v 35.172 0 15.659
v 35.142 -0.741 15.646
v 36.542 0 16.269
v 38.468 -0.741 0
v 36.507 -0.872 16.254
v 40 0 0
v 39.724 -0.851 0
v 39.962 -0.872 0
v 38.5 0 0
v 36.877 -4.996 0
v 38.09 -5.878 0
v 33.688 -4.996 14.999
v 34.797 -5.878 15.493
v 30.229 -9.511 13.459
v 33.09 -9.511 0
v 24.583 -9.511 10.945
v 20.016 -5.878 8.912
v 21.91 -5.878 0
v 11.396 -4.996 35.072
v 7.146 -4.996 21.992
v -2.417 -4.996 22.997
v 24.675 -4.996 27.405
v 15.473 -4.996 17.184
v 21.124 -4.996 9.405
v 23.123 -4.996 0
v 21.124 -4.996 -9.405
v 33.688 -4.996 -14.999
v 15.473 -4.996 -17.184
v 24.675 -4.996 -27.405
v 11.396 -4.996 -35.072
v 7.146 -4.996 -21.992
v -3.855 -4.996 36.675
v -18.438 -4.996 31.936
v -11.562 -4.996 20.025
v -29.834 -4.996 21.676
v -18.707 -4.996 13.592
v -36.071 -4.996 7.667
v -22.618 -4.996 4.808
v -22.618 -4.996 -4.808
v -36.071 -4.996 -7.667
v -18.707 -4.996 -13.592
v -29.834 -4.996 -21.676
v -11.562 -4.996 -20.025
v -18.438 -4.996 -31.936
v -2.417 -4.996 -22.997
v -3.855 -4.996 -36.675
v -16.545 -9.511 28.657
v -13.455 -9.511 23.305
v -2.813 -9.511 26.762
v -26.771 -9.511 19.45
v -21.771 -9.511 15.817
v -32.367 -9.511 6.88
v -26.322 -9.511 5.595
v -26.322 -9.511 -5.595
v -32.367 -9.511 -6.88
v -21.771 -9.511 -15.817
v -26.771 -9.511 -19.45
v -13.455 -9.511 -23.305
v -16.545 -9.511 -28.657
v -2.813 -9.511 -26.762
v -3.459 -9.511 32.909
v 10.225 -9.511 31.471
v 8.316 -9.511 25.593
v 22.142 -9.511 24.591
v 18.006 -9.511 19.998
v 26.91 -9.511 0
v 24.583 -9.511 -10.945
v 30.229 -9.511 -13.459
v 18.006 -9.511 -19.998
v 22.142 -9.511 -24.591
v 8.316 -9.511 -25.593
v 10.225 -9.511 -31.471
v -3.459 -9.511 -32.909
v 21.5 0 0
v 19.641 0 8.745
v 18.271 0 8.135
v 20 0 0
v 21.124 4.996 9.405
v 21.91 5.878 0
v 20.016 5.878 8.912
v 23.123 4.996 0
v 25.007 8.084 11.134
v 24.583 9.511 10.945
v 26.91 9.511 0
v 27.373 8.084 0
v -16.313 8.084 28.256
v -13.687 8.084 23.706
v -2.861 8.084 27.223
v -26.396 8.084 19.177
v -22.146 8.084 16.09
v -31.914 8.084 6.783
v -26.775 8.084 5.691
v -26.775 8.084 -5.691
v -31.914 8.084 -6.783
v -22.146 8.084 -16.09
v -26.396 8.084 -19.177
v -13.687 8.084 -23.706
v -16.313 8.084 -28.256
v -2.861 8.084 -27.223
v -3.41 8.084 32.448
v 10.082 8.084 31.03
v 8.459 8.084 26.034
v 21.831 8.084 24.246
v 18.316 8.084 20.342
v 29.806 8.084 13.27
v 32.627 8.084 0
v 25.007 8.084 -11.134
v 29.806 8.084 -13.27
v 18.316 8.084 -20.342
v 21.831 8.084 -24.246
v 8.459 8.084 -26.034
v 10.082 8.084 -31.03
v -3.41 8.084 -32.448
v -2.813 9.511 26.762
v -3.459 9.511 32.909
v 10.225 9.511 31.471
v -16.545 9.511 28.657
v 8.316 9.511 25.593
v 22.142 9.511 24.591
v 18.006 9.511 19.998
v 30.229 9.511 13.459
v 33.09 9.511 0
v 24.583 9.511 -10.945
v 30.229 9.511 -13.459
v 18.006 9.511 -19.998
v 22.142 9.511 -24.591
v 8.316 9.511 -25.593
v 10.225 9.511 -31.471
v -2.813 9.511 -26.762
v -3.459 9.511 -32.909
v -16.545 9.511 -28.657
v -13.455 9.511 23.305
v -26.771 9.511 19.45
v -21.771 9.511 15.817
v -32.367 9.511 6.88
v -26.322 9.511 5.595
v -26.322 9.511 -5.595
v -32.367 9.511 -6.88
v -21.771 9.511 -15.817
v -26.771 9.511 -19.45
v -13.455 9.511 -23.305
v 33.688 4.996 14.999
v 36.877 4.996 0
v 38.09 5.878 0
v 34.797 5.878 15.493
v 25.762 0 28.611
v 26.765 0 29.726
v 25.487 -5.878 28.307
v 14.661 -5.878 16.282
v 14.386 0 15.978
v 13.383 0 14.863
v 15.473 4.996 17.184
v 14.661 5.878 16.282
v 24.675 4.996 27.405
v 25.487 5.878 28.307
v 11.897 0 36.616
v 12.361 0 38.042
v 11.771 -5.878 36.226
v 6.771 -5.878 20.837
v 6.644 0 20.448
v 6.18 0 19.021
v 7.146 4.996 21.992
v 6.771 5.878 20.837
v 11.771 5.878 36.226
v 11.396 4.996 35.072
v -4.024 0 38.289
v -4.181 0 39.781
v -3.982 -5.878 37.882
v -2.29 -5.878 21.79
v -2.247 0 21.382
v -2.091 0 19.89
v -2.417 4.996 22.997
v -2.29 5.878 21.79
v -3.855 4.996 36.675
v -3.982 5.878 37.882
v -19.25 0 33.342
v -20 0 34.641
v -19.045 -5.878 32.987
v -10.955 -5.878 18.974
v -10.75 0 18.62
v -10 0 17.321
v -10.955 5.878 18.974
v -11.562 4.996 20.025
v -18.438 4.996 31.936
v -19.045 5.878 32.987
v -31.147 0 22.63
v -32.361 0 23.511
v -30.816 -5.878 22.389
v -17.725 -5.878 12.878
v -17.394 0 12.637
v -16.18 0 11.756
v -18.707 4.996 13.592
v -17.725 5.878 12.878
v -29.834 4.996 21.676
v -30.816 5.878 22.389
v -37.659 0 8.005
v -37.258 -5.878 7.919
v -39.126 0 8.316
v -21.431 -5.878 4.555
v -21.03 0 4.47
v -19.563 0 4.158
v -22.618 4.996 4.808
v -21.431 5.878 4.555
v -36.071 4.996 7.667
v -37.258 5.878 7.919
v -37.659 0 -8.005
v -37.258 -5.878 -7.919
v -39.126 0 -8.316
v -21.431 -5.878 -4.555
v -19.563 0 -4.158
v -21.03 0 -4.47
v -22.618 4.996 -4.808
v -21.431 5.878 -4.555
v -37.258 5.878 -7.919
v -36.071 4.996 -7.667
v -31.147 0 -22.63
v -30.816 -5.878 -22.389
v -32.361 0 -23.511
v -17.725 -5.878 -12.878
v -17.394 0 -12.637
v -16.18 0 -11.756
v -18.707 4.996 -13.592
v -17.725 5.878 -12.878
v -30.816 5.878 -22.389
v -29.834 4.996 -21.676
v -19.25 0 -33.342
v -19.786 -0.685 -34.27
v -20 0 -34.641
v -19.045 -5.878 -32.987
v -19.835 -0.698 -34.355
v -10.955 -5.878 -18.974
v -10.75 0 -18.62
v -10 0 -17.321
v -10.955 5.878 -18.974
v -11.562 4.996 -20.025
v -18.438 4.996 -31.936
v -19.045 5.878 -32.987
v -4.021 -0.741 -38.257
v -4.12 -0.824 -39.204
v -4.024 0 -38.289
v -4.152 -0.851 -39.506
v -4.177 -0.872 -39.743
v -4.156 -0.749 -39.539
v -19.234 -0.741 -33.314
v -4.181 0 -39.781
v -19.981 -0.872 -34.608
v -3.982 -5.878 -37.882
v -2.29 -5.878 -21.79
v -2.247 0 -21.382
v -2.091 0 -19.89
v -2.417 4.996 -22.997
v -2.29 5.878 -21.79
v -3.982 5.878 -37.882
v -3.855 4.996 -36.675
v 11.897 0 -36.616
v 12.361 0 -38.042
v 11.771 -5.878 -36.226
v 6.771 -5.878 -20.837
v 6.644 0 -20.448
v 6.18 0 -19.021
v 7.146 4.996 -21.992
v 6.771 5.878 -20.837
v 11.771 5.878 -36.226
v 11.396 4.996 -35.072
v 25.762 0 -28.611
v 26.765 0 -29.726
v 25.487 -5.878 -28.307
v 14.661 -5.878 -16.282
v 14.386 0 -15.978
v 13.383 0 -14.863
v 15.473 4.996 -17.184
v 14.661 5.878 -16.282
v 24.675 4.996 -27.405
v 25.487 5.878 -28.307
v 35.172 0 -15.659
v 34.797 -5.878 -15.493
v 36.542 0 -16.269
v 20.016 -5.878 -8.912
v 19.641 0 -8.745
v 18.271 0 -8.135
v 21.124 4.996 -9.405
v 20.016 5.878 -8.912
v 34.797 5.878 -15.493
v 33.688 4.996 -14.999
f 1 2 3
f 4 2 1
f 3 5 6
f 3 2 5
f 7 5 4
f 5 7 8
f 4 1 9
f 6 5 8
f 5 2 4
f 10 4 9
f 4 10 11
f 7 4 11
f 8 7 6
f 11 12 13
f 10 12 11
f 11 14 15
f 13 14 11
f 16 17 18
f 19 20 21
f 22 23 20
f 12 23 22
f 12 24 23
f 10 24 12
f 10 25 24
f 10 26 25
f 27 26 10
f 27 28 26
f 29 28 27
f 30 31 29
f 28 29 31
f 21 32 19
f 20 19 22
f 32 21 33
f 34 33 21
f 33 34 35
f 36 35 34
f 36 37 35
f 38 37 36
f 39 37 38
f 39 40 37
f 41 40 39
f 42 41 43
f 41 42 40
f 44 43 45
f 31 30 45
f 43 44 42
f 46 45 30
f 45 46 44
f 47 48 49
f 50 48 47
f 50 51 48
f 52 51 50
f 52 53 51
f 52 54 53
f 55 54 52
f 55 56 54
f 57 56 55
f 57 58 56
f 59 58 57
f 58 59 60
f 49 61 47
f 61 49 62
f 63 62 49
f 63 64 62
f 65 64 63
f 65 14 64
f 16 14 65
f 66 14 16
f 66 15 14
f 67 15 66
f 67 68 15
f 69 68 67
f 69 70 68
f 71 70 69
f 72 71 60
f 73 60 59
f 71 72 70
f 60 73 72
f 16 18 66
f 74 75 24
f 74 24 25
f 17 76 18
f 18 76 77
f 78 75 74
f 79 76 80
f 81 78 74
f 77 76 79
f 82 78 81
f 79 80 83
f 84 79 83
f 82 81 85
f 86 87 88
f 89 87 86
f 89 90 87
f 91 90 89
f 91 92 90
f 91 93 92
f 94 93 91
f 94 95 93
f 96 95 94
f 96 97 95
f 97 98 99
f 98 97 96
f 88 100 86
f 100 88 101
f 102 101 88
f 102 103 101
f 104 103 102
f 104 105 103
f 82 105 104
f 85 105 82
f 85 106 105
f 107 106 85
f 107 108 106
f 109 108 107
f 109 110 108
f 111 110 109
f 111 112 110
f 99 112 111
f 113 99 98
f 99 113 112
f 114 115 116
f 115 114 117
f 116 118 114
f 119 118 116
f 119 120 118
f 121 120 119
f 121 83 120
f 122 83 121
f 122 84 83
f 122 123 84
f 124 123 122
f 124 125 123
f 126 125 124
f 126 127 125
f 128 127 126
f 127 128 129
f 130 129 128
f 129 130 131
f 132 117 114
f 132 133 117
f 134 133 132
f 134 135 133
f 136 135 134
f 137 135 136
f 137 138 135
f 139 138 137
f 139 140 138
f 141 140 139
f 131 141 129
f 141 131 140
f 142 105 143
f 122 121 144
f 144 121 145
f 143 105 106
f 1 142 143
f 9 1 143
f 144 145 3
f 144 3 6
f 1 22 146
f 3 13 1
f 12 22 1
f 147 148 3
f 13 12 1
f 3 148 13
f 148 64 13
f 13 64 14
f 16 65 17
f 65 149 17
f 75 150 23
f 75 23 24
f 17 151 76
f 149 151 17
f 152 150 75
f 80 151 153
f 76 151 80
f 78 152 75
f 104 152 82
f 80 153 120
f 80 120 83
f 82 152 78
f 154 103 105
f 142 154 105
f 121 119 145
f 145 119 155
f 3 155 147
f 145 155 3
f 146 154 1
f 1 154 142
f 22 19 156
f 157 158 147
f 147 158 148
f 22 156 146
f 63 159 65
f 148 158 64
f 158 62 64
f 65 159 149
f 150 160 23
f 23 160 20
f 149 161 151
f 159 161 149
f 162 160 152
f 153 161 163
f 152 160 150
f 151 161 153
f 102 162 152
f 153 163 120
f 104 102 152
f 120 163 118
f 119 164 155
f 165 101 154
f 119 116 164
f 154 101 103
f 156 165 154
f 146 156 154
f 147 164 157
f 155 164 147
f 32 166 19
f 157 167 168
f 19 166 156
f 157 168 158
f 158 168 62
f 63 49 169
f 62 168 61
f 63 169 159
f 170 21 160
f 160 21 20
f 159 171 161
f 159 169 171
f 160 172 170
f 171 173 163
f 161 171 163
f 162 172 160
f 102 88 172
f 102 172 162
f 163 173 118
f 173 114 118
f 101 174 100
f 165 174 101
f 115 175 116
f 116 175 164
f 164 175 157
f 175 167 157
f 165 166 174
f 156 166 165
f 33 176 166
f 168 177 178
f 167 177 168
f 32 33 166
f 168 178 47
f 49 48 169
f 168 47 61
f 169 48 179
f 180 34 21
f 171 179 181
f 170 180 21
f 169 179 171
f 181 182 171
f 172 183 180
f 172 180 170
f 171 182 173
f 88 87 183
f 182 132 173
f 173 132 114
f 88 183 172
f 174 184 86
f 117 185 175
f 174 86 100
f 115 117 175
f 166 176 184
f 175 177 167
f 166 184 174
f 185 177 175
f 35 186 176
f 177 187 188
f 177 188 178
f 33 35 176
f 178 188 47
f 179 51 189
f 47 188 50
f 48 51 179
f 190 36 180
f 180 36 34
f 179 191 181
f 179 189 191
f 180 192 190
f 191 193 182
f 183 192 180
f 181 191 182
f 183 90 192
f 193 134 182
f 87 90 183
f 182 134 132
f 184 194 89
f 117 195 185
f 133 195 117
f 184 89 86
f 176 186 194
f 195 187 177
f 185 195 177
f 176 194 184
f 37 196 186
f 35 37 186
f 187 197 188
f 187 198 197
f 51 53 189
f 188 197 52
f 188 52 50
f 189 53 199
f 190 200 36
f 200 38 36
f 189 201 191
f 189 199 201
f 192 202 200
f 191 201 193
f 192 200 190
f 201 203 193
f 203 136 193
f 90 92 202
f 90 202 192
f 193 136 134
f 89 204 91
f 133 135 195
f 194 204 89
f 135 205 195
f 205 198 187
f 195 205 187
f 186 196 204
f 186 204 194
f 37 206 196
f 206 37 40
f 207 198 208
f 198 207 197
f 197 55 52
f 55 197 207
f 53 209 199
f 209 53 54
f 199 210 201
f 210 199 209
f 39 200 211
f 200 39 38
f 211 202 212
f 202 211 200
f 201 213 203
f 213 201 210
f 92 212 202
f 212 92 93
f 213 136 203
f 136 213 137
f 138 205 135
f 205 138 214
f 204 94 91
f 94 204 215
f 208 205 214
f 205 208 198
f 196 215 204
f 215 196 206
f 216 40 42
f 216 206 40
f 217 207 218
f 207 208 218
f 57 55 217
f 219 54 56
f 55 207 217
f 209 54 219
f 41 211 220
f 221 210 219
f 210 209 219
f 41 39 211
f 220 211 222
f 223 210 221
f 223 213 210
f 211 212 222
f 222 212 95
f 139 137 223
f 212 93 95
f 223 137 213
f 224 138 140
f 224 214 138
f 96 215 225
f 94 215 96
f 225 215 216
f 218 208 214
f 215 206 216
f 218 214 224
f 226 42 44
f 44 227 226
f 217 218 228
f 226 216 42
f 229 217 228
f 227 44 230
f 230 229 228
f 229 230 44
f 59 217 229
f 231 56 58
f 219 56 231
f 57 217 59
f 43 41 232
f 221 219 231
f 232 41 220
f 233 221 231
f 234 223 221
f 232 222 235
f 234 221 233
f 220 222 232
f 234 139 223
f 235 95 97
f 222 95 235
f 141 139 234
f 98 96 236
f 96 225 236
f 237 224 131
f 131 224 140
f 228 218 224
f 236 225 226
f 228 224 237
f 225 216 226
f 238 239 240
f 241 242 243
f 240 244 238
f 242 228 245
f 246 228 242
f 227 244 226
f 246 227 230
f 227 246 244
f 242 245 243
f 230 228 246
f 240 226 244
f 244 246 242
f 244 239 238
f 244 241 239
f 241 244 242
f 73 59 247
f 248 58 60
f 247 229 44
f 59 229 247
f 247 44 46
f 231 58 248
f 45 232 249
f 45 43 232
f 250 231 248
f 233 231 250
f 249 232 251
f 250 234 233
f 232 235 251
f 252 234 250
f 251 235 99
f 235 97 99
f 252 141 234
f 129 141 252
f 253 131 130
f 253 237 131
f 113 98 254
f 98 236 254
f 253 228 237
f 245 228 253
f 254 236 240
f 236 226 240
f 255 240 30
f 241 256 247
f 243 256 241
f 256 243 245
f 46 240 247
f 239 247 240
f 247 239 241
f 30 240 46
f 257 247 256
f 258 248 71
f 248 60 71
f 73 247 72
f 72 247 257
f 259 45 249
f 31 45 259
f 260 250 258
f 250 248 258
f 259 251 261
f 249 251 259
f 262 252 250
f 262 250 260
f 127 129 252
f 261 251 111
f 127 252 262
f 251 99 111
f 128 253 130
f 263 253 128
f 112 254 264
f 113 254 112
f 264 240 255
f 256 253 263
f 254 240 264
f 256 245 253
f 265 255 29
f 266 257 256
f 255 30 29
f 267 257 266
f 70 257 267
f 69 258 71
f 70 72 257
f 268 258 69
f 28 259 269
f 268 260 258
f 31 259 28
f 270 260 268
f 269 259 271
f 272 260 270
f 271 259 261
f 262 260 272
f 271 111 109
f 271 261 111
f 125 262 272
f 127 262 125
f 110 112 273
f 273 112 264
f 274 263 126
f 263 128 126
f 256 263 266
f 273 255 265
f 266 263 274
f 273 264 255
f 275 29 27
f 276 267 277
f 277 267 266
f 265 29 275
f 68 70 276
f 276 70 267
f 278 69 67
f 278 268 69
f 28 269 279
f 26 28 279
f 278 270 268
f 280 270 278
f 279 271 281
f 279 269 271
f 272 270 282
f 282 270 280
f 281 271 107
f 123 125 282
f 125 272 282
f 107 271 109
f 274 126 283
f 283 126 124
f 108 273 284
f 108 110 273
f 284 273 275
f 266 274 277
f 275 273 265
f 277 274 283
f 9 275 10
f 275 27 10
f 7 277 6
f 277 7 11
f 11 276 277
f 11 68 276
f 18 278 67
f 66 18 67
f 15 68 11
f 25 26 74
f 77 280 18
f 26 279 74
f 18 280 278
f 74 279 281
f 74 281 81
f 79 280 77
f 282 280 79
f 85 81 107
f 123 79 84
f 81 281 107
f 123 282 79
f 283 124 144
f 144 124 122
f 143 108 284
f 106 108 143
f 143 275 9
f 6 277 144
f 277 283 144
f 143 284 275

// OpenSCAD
torus_radius = 30;
chamber_radius = 10;
wall_thickness = 1.5;
tor_segments = 15;
pol_segments = 10;


// https://en.wikipedia.org/wiki/Toroidal_and_poloidal
// http://fusionwiki.ciemat.es/wiki/Toroidal_coordinates
// https://en.wikibooks.org/wiki/OpenSCAD_User_Manual/User-Defined_Functions_and_Modules

// R0 is radius from origin to center of circle that is swept to form torus
// r is radius of swept circle
// toroidal_angle controls direction of R0
// poloidal_angle controls direction of r
function toroidal_tor_x(R0, r, toroidal_angle, poloidal_angle) = (R0 + (r * cos(poloidal_angle))) * cos(toroidal_angle);
function toroidal_tor_y(R0, r, toroidal_angle, poloidal_angle) = (R0 + (r * cos(poloidal_angle))) * sin(toroidal_angle);
function toroidal_tor_z(R0, r, toroidal_angle, poloidal_angle) = r * sin(poloidal_angle);


module toroidal_section_by_angle(tor_low, tor_high, pol_low, pol_high) {
    p0x = toroidal_tor_x(torus_radius, chamber_radius - wall_thickness, tor_low, pol_low);
    p0y = toroidal_tor_y(torus_radius, chamber_radius - wall_thickness, tor_low, pol_low);
    p0z = toroidal_tor_z(torus_radius, chamber_radius - wall_thickness, tor_low, pol_low);

    p1x = toroidal_tor_x(torus_radius, chamber_radius - wall_thickness, tor_low, pol_high);
    p1y = toroidal_tor_y(torus_radius, chamber_radius - wall_thickness, tor_low, pol_high);
    p1z = toroidal_tor_z(torus_radius, chamber_radius - wall_thickness, tor_low, pol_high);

    p2x = toroidal_tor_x(torus_radius, chamber_radius - wall_thickness, tor_high, pol_high);
    p2y = toroidal_tor_y(torus_radius, chamber_radius - wall_thickness, tor_high, pol_high);
    p2z = toroidal_tor_z(torus_radius, chamber_radius - wall_thickness, tor_high, pol_high);

    p3x = toroidal_tor_x(torus_radius, chamber_radius - wall_thickness, tor_high, pol_low);
    p3y = toroidal_tor_y(torus_radius, chamber_radius - wall_thickness, tor_high, pol_low);
    p3z = toroidal_tor_z(torus_radius, chamber_radius - wall_thickness, tor_high, pol_low);

    p4x = toroidal_tor_x(torus_radius, chamber_radius, tor_low, pol_low);
    p4y = toroidal_tor_y(torus_radius, chamber_radius, tor_low, pol_low);
    p4z = toroidal_tor_z(torus_radius, chamber_radius, tor_low, pol_low);

    p5x = toroidal_tor_x(torus_radius, chamber_radius, tor_low, pol_high);
    p5y = toroidal_tor_y(torus_radius, chamber_radius, tor_low, pol_high);
    p5z = toroidal_tor_z(torus_radius, chamber_radius, tor_low, pol_high);

    p6x = toroidal_tor_x(torus_radius, chamber_radius, tor_high, pol_high);
    p6y = toroidal_tor_y(torus_radius, chamber_radius, tor_high, pol_high);
    p6z = toroidal_tor_z(torus_radius, chamber_radius, tor_high, pol_high);

    p7x = toroidal_tor_x(torus_radius, chamber_radius, tor_high, pol_low);
    p7y = toroidal_tor_y(torus_radius, chamber_radius, tor_high, pol_low);
    p7z = toroidal_tor_z(torus_radius, chamber_radius, tor_high, pol_low);

    polyhedron(
        points = [[p0x, p0y, p0z],
                  [p1x, p1y, p1z],
                  [p2x, p2y, p2z],
                  [p3x, p3y, p3z],
                  [p4x, p4y, p4z],
                  [p5x, p5y, p5z],
                  [p6x, p6y, p6z],
                  [p7x, p7y, p7z]],
        faces = [[1, 2, 3],
                 [3, 0, 1],
                 [5, 1, 0],
                 [0, 4, 5],
                 [6, 5, 4],
                 [4, 7, 6],
                 [2, 6, 2],
                 [7, 3, 2],
                 [0, 3, 7],
                 [7, 4, 0],
                 [5, 6, 2],
                 [2, 1, 5]
            ],
        convexity = 10);
}


module toroidal_section_by_index(toroidal_segment, poloidal_segment) {
    // tor_low = (toroidal_segment / tor_segments) * 360 + 5;
    // tor_high = ((toroidal_segment + 1) / tor_segments) * 360 - 5;
    // pol_low = (poloidal_segment / pol_segments) * 360 + 5;
    // pol_high = ((poloidal_segment + 1) / pol_segments) * 360 - 5;

    if ((toroidal_segment == 0 && poloidal_segment == 0) ||
        // (toroidal_segment == 5 && poloidal_segment == 0) ||
        (toroidal_segment == 10 && poloidal_segment == 0)
        ) {
        tor_low = (toroidal_segment / tor_segments) * 360;
        tor_high = ((toroidal_segment + 1) / tor_segments) * 360;
        pol_low = (poloidal_segment / pol_segments) * 360;
        pol_high = pol_low + 5;

        hull() {
            toroidal_section_by_angle(tor_low, tor_high, pol_low, pol_high);
        }
    } else {
        tor_low = (toroidal_segment / tor_segments) * 360;
        tor_high = ((toroidal_segment + 1) / tor_segments) * 360;
        pol_low = (poloidal_segment / pol_segments) * 360;
        pol_high = ((poloidal_segment + 1) / pol_segments) * 360;

        hull() {
            toroidal_section_by_angle(tor_low, tor_high, pol_low, pol_high);
        }
    }
}


module ring_section(tor_index, pol_index) {
    if (pol_index == 0) {
        // wall -- outer standing-height section
        toroidal_section_by_index(tor_index, 0);
    } else if (pol_index == 1) {
        // floor
        hull() {
            toroidal_section_by_index(tor_index, 1);
            toroidal_section_by_index(tor_index, 2);
            toroidal_section_by_index(tor_index, 3);
        }
    } else {
        // inner wall and ceiling
        toroidal_section_by_index(tor_index, pol_index + 2);
    }
}

part_index = -1;

union() {
    rotate([90, 0, 0]) {
        if (part_index == -1) {
            for (tor_index = [0 : 1 : tor_segments - 1]) {
                for (pol_index = [0 : 1 : pol_segments - 3]) {
                    ring_section(tor_index, pol_index);
                }
            }
        } else {
            // if tor_segments = 15 and pol_segments = 10,
            // tor_index goes from 0 to 14
            // pol_index goes from 0 to 8
            tor_index = part_index % tor_segments;
            pol_index = (part_index - tor_index) / tor_segments;
            ring_section(tor_index, pol_index);
        }
    }
}
